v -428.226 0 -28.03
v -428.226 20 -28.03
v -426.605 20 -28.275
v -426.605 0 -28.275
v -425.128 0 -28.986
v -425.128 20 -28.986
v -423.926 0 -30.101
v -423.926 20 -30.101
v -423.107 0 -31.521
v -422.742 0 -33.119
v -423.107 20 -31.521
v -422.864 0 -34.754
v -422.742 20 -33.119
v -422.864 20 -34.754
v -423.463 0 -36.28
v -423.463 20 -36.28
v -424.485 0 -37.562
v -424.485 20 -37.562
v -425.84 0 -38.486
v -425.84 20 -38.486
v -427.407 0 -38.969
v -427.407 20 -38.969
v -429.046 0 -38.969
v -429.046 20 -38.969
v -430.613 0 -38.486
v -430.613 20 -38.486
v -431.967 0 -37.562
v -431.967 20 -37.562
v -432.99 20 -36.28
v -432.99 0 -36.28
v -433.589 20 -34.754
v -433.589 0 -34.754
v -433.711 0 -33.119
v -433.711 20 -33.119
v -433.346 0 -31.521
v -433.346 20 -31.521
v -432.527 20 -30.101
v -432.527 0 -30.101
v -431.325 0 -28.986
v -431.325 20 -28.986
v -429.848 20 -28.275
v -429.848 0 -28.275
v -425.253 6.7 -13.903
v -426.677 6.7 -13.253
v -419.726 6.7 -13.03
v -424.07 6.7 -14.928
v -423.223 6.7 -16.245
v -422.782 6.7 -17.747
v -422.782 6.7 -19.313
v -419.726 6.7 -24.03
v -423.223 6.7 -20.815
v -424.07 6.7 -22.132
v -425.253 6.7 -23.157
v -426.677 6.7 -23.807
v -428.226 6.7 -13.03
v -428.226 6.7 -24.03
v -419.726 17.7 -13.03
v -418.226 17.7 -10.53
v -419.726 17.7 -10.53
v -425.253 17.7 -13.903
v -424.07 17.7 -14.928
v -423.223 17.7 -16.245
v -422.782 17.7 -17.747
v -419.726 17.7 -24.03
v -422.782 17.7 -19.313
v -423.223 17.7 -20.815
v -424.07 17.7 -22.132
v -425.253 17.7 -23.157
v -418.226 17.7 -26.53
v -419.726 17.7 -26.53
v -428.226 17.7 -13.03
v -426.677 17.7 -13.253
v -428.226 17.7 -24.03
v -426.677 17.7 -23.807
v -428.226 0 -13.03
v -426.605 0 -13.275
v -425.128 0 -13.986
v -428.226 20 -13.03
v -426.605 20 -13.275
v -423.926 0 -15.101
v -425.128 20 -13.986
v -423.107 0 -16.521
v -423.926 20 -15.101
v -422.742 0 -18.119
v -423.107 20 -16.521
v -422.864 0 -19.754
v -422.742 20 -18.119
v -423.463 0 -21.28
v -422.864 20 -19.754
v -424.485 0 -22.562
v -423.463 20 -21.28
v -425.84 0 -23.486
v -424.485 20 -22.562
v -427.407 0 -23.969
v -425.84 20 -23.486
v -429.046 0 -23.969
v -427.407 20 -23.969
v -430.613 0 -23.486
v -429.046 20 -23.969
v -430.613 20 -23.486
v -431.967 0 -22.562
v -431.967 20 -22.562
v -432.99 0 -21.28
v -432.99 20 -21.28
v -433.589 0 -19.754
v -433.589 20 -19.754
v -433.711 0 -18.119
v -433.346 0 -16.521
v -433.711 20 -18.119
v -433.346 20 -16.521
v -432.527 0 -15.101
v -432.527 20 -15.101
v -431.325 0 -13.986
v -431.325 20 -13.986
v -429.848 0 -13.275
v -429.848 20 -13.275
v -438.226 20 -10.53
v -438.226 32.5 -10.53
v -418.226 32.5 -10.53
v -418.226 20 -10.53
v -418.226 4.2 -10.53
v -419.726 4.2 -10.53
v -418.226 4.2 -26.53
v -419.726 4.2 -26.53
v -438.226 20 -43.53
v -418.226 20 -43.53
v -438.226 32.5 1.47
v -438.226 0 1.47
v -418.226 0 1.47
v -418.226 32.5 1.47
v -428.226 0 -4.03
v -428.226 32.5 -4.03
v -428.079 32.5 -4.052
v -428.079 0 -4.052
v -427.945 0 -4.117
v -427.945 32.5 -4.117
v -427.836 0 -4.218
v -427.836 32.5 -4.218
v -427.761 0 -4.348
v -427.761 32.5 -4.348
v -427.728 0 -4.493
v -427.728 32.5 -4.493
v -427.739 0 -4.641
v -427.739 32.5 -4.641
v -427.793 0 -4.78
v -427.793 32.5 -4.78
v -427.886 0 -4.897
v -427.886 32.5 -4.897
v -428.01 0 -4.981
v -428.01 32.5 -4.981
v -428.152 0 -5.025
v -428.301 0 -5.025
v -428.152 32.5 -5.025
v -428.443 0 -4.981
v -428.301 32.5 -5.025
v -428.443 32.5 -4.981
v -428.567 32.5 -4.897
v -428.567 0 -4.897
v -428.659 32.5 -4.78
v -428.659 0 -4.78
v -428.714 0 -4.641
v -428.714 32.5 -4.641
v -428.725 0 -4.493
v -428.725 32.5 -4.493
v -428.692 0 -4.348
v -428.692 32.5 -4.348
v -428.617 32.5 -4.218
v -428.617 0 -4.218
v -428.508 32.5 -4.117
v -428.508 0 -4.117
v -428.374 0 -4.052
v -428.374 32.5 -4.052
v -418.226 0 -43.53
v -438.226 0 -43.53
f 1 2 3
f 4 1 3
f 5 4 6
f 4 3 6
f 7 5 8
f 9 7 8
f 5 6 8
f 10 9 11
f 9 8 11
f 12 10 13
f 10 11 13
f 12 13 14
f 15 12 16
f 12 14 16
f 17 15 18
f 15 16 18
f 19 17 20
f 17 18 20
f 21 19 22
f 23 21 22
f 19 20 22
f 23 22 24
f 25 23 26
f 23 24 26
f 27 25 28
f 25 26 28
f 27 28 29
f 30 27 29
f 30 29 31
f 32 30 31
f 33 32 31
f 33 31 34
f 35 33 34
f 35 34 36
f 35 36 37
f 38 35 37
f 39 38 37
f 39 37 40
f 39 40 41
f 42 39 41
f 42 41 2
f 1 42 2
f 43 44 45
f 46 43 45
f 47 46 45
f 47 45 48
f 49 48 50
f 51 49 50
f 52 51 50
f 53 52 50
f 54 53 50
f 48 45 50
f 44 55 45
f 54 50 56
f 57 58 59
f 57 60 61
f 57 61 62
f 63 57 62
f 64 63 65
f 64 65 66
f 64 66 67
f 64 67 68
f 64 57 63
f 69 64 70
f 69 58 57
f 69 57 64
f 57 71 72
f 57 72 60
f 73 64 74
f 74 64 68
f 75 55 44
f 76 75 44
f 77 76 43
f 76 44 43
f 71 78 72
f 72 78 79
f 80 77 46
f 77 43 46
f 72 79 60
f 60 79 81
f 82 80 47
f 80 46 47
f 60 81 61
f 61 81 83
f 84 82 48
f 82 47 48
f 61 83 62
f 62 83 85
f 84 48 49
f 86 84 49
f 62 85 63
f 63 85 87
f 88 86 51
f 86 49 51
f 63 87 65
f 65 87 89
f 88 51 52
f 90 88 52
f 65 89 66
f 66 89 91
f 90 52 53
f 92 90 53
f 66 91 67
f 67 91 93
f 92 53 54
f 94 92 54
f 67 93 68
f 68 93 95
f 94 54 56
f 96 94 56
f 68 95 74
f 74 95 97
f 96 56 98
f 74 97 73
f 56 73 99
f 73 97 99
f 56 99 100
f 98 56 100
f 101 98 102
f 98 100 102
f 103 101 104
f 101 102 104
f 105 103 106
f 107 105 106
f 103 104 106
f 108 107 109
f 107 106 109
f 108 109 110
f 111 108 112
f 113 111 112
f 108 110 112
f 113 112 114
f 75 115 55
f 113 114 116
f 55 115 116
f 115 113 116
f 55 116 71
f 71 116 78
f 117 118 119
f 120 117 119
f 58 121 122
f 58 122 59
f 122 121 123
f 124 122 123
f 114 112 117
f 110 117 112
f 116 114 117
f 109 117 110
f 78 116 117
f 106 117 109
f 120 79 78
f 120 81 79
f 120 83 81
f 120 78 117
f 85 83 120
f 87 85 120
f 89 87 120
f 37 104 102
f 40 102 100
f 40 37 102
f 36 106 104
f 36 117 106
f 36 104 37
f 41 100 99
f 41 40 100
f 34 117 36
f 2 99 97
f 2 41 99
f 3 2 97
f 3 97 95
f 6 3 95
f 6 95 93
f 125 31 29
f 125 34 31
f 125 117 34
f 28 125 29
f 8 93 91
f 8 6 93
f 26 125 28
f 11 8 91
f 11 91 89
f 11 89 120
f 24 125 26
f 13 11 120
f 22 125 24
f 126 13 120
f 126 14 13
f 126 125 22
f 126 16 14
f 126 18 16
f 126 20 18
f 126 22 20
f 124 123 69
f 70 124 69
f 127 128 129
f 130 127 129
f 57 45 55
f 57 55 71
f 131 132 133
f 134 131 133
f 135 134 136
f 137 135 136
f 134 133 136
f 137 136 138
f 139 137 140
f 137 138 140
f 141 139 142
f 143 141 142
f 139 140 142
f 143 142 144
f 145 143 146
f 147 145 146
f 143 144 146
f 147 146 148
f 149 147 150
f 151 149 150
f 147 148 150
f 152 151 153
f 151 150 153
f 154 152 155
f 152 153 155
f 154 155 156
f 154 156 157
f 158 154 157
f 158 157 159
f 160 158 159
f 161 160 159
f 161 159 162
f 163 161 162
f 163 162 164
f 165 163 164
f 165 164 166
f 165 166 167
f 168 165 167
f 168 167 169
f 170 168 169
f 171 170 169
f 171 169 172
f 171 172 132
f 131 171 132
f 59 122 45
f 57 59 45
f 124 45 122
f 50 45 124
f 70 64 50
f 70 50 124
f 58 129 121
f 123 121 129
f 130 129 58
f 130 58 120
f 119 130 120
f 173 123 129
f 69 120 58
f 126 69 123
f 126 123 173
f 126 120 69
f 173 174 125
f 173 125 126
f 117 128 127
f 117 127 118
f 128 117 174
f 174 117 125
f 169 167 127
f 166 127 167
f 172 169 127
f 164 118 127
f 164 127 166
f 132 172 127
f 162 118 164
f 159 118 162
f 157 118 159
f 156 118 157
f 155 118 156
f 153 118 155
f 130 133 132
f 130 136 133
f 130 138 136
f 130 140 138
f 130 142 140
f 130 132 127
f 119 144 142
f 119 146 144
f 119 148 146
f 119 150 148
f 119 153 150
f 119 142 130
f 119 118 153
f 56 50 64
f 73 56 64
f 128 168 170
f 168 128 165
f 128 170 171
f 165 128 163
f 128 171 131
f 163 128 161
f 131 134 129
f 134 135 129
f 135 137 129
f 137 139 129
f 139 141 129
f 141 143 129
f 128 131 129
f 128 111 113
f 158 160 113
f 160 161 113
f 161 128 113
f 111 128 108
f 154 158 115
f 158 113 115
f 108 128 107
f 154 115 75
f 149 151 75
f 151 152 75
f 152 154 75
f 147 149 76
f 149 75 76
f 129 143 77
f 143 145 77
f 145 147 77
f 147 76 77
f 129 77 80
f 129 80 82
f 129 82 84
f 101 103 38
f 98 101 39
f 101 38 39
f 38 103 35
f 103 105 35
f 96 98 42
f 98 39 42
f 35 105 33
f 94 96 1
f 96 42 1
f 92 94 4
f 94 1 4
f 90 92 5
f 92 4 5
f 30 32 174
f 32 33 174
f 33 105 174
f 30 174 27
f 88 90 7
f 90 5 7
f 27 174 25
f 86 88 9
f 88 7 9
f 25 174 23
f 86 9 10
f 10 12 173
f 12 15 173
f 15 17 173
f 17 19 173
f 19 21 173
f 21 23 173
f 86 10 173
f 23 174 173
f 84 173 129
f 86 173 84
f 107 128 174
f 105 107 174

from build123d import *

# Parameters (mm, degrees)
CROQUIS1_W              = 20
CROQUIS1_H              = 35
CROQUIS1_R              = 5
SALIENTE_EXTRUIR1_DEPTH = 20
CROQUIS2_R              = 2
SALIENTE_EXTRUIR2_DEPTH = 8
CROQUIS3_W              = 20
CROQUIS3_H              = 20
SALIENTE_EXTRUIR3_DEPTH = 10
CORTAR_EXTRUIR1_REACH   = 442.837
CROQUIS4_R              = 0.5
SALIENTE_EXTRUIR4_START = 12.5
CROQUIS5_W              = 20
CROQUIS5_H              = 12
CROQUIS5_R              = 0.5
SALIENTE_EXTRUIR4_DEPTH = 12.5
CROQUIS6_R              = 5.5
CORTAR_EXTRUIR2_DEPTH   = 441.837042541
CROQUIS7_W              = 11
CROQUIS7_H              = 11
CORTAR_EXTRUIR3_DEPTH   = 18
CROQUIS8_W              = 16
CROQUIS8_H              = 13.5
CORTAR_EXTRUIR4_DEPTH   = 1.5


with BuildPart() as part:
    # Croquis1 → Saliente-Extruir1 (new body)
    with BuildSketch(Plane(origin=(0, 0, 0), x_dir=(1, 0, 0), z_dir=(0, 1, 0))):
        with Locations((-428.226450018, 26.030180121)):
            Rectangle(CROQUIS1_W, CROQUIS1_H)
        with Locations(Location((-428.226450018, 18.530180121, 0), (0, 0, 270))):
            Circle(CROQUIS1_R, mode=Mode.SUBTRACT)
        with Locations(Location((-428.226450018, 33.530180121, 0), (0, 0, 270))):
            Circle(CROQUIS1_R, mode=Mode.SUBTRACT)
    extrude(amount=SALIENTE_EXTRUIR1_DEPTH)

    # Croquis2 → Saliente-Extruir2 (add)
    with BuildSketch(Plane(origin=(-418.226450018, 0, 0), x_dir=(0, 0, -1), z_dir=(1, 0, 0))):
        with Locations(Location((18.530180121, 12.2, 0), (0, 0, 180))):
            Circle(CROQUIS2_R)
    extrude(amount=SALIENTE_EXTRUIR2_DEPTH)

    # Croquis3 → Saliente-Extruir3 (add)
    with BuildSketch(Plane.XY.offset(-8.530180121)):
        with Locations((-428.226450018, 10)):
            Rectangle(CROQUIS3_W, CROQUIS3_H)
    extrude(amount=SALIENTE_EXTRUIR3_DEPTH)

    # Croquis4 → Cortar-Extruir1 (cut, up to next)
    with BuildSketch(Plane(origin=(0, 20, 0), x_dir=(1, 0, 0), z_dir=(0, 1, 0)), mode=Mode.PRIVATE) as cortar_extruir1_sk1:
        with Locations(Location((-428.226450018, 4.530180121, 0), (0, 0, 270))):
            Circle(CROQUIS4_R)
    cortar_extruir1_tool1 = extrude(cortar_extruir1_sk1.sketch, amount=-CORTAR_EXTRUIR1_REACH, mode=Mode.PRIVATE) & part.part
    add(cortar_extruir1_tool1.solids().sort_by_distance((-428.22645, 20, -4.53018))[0], mode=Mode.SUBTRACT)

    # Croquis5 → Saliente-Extruir4 (add)
    with BuildSketch(Plane(origin=(0, 20, 0), x_dir=(1, 0, 0), z_dir=(0, 1, 0)).offset(SALIENTE_EXTRUIR4_START)):
        with Locations((-428.226450018, 4.530180121)):
            Rectangle(CROQUIS5_W, CROQUIS5_H)
        with Locations(Location((-428.226450018, 4.530180121, 0), (0, 0, 270))):
            Circle(CROQUIS5_R, mode=Mode.SUBTRACT)
    extrude(amount=-SALIENTE_EXTRUIR4_DEPTH)

    # Croquis6 → Cortar-Extruir2 (cut, through all)
    with BuildSketch(Plane(origin=(0, 20, 0), x_dir=(1, 0, 0), z_dir=(0, 1, 0))):
        with Locations(Location((-428.226450018, 18.530180121, 0), (0, 0, 270))):
            Circle(CROQUIS6_R)
        with Locations(Location((-428.226450018, 33.530180121, 0), (0, 0, 270))):
            Circle(CROQUIS6_R)
    extrude(amount=-CORTAR_EXTRUIR2_DEPTH, mode=Mode.SUBTRACT)

    # Croquis7 → Cortar-Extruir3 (cut)
    with BuildSketch(Plane(origin=(-410.226450018, 0, 0), x_dir=(0, 0, -1), z_dir=(1, 0, 0))):
        with Locations((18.530180121, 12.2)):
            Rectangle(CROQUIS7_W, CROQUIS7_H)
    extrude(amount=-CORTAR_EXTRUIR3_DEPTH, mode=Mode.SUBTRACT)

    # Croquis8 → Cortar-Extruir4 (cut)
    with BuildSketch(Plane(origin=(-418.226450018, 0, 0), x_dir=(0, 0, -1), z_dir=(1, 0, 0))):
        with Locations((18.530180121, 10.95)):
            Rectangle(CROQUIS8_W, CROQUIS8_H)
    extrude(amount=-CORTAR_EXTRUIR4_DEPTH, mode=Mode.SUBTRACT)


solid = part.part
